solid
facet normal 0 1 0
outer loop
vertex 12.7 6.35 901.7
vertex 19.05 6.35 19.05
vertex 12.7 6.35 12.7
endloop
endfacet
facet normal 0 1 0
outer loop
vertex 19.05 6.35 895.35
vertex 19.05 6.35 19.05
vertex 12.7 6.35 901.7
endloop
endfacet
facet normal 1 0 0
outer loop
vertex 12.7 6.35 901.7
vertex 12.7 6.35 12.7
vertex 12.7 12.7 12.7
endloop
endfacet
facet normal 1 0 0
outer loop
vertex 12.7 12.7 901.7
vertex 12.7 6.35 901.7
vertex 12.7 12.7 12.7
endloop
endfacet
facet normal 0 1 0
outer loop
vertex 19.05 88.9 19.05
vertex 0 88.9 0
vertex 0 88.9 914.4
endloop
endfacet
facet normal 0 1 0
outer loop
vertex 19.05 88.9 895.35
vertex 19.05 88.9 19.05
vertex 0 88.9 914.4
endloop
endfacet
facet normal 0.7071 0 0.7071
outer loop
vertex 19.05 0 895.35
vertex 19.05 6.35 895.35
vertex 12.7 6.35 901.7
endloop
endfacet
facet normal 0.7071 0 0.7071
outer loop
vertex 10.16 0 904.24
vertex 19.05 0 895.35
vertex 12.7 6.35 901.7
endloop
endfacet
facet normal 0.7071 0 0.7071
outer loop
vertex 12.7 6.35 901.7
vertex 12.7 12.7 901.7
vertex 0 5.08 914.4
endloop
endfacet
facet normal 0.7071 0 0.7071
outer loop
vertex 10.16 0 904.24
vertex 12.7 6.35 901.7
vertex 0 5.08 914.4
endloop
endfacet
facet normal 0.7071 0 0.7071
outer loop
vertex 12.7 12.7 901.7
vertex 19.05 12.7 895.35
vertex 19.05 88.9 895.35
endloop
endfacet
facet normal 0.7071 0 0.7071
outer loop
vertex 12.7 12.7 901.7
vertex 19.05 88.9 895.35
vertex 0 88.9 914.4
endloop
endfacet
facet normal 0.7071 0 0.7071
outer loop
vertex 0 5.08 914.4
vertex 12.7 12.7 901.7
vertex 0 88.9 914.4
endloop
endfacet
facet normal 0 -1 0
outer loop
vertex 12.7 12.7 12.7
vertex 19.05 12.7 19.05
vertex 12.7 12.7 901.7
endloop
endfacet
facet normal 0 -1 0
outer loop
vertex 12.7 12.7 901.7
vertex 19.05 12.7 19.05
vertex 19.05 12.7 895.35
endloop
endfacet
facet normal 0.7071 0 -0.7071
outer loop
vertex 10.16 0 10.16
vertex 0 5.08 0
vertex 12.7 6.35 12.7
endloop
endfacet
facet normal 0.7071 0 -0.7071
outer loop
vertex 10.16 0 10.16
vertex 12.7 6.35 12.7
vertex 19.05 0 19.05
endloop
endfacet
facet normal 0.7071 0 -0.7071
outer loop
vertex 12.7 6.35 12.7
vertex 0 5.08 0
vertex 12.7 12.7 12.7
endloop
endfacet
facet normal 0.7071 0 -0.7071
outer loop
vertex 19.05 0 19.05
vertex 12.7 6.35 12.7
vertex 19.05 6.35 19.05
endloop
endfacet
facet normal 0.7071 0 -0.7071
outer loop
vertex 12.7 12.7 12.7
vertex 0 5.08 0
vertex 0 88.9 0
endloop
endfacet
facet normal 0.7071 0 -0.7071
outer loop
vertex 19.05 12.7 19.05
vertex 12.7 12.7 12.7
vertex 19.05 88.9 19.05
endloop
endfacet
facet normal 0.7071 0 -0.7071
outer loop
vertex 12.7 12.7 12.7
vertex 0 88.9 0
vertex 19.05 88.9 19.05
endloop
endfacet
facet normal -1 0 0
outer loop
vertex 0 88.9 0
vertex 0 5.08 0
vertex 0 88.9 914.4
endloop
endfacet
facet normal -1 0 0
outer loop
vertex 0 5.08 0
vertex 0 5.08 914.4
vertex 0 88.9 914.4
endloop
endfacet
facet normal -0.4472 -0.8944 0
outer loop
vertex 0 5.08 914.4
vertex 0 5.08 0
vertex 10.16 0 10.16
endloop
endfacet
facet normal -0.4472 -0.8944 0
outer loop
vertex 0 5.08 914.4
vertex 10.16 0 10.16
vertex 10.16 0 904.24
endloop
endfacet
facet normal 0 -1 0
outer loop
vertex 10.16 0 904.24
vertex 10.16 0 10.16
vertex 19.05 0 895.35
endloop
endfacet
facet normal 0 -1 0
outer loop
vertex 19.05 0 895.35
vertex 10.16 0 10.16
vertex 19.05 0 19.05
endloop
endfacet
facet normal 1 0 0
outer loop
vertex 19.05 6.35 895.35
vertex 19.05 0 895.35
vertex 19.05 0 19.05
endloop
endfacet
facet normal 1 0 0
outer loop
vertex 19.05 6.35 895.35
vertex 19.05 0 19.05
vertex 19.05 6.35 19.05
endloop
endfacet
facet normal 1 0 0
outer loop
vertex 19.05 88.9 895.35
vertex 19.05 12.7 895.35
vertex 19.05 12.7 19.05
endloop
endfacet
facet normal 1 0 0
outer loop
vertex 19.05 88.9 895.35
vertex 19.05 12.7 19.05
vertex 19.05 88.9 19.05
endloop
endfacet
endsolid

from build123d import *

# Parameters (mm, degrees)
F0_W     = 88.9
F0_H     = 914.4
F1_DEPTH = 19.05
F2_W     = 6.35
F2_H     = 914.4
F3_DEPTH = 6.35
F4_SIZE2 = 5.08
F4_SIZE  = 10.16
F6_DEPTH = 88.901


with BuildPart() as f1:
    # F0 (on Right) → F1 (new body)
    with BuildSketch(Plane.YZ):
        with Locations((44.45, 457.2)):
            Rectangle(F0_W, F0_H)
    extrude(amount=F1_DEPTH)

    # F2 (on face) → F3 (cut)
    with BuildSketch(Plane.YZ.offset(19.05)):
        with Locations((9.525, 457.2)):
            Rectangle(F2_W, F2_H)
    extrude(amount=-F3_DEPTH, mode=Mode.SUBTRACT)

    # F4
    f4_edges = [f1.edges().sort_by_distance(p)[0] for p in [
        (0, 0, 457.2),
    ]]
    chamfer(f4_edges, length=F4_SIZE, length2=F4_SIZE2)

    # F5 (on face) → F6 (cut, through all)
    with BuildSketch(Plane(origin=(0, 88.9, 0), x_dir=(-1, 0, 0), z_dir=(0, 1, 0))):
        Polygon((-19.05, 895.35), (0, 914.4), (-19.05, 914.4), align=None)
        Polygon((-19.05, 0), (0, 0), (-19.05, 19.05), align=None)
    extrude(amount=-F6_DEPTH, mode=Mode.SUBTRACT)


solid = f1.part
